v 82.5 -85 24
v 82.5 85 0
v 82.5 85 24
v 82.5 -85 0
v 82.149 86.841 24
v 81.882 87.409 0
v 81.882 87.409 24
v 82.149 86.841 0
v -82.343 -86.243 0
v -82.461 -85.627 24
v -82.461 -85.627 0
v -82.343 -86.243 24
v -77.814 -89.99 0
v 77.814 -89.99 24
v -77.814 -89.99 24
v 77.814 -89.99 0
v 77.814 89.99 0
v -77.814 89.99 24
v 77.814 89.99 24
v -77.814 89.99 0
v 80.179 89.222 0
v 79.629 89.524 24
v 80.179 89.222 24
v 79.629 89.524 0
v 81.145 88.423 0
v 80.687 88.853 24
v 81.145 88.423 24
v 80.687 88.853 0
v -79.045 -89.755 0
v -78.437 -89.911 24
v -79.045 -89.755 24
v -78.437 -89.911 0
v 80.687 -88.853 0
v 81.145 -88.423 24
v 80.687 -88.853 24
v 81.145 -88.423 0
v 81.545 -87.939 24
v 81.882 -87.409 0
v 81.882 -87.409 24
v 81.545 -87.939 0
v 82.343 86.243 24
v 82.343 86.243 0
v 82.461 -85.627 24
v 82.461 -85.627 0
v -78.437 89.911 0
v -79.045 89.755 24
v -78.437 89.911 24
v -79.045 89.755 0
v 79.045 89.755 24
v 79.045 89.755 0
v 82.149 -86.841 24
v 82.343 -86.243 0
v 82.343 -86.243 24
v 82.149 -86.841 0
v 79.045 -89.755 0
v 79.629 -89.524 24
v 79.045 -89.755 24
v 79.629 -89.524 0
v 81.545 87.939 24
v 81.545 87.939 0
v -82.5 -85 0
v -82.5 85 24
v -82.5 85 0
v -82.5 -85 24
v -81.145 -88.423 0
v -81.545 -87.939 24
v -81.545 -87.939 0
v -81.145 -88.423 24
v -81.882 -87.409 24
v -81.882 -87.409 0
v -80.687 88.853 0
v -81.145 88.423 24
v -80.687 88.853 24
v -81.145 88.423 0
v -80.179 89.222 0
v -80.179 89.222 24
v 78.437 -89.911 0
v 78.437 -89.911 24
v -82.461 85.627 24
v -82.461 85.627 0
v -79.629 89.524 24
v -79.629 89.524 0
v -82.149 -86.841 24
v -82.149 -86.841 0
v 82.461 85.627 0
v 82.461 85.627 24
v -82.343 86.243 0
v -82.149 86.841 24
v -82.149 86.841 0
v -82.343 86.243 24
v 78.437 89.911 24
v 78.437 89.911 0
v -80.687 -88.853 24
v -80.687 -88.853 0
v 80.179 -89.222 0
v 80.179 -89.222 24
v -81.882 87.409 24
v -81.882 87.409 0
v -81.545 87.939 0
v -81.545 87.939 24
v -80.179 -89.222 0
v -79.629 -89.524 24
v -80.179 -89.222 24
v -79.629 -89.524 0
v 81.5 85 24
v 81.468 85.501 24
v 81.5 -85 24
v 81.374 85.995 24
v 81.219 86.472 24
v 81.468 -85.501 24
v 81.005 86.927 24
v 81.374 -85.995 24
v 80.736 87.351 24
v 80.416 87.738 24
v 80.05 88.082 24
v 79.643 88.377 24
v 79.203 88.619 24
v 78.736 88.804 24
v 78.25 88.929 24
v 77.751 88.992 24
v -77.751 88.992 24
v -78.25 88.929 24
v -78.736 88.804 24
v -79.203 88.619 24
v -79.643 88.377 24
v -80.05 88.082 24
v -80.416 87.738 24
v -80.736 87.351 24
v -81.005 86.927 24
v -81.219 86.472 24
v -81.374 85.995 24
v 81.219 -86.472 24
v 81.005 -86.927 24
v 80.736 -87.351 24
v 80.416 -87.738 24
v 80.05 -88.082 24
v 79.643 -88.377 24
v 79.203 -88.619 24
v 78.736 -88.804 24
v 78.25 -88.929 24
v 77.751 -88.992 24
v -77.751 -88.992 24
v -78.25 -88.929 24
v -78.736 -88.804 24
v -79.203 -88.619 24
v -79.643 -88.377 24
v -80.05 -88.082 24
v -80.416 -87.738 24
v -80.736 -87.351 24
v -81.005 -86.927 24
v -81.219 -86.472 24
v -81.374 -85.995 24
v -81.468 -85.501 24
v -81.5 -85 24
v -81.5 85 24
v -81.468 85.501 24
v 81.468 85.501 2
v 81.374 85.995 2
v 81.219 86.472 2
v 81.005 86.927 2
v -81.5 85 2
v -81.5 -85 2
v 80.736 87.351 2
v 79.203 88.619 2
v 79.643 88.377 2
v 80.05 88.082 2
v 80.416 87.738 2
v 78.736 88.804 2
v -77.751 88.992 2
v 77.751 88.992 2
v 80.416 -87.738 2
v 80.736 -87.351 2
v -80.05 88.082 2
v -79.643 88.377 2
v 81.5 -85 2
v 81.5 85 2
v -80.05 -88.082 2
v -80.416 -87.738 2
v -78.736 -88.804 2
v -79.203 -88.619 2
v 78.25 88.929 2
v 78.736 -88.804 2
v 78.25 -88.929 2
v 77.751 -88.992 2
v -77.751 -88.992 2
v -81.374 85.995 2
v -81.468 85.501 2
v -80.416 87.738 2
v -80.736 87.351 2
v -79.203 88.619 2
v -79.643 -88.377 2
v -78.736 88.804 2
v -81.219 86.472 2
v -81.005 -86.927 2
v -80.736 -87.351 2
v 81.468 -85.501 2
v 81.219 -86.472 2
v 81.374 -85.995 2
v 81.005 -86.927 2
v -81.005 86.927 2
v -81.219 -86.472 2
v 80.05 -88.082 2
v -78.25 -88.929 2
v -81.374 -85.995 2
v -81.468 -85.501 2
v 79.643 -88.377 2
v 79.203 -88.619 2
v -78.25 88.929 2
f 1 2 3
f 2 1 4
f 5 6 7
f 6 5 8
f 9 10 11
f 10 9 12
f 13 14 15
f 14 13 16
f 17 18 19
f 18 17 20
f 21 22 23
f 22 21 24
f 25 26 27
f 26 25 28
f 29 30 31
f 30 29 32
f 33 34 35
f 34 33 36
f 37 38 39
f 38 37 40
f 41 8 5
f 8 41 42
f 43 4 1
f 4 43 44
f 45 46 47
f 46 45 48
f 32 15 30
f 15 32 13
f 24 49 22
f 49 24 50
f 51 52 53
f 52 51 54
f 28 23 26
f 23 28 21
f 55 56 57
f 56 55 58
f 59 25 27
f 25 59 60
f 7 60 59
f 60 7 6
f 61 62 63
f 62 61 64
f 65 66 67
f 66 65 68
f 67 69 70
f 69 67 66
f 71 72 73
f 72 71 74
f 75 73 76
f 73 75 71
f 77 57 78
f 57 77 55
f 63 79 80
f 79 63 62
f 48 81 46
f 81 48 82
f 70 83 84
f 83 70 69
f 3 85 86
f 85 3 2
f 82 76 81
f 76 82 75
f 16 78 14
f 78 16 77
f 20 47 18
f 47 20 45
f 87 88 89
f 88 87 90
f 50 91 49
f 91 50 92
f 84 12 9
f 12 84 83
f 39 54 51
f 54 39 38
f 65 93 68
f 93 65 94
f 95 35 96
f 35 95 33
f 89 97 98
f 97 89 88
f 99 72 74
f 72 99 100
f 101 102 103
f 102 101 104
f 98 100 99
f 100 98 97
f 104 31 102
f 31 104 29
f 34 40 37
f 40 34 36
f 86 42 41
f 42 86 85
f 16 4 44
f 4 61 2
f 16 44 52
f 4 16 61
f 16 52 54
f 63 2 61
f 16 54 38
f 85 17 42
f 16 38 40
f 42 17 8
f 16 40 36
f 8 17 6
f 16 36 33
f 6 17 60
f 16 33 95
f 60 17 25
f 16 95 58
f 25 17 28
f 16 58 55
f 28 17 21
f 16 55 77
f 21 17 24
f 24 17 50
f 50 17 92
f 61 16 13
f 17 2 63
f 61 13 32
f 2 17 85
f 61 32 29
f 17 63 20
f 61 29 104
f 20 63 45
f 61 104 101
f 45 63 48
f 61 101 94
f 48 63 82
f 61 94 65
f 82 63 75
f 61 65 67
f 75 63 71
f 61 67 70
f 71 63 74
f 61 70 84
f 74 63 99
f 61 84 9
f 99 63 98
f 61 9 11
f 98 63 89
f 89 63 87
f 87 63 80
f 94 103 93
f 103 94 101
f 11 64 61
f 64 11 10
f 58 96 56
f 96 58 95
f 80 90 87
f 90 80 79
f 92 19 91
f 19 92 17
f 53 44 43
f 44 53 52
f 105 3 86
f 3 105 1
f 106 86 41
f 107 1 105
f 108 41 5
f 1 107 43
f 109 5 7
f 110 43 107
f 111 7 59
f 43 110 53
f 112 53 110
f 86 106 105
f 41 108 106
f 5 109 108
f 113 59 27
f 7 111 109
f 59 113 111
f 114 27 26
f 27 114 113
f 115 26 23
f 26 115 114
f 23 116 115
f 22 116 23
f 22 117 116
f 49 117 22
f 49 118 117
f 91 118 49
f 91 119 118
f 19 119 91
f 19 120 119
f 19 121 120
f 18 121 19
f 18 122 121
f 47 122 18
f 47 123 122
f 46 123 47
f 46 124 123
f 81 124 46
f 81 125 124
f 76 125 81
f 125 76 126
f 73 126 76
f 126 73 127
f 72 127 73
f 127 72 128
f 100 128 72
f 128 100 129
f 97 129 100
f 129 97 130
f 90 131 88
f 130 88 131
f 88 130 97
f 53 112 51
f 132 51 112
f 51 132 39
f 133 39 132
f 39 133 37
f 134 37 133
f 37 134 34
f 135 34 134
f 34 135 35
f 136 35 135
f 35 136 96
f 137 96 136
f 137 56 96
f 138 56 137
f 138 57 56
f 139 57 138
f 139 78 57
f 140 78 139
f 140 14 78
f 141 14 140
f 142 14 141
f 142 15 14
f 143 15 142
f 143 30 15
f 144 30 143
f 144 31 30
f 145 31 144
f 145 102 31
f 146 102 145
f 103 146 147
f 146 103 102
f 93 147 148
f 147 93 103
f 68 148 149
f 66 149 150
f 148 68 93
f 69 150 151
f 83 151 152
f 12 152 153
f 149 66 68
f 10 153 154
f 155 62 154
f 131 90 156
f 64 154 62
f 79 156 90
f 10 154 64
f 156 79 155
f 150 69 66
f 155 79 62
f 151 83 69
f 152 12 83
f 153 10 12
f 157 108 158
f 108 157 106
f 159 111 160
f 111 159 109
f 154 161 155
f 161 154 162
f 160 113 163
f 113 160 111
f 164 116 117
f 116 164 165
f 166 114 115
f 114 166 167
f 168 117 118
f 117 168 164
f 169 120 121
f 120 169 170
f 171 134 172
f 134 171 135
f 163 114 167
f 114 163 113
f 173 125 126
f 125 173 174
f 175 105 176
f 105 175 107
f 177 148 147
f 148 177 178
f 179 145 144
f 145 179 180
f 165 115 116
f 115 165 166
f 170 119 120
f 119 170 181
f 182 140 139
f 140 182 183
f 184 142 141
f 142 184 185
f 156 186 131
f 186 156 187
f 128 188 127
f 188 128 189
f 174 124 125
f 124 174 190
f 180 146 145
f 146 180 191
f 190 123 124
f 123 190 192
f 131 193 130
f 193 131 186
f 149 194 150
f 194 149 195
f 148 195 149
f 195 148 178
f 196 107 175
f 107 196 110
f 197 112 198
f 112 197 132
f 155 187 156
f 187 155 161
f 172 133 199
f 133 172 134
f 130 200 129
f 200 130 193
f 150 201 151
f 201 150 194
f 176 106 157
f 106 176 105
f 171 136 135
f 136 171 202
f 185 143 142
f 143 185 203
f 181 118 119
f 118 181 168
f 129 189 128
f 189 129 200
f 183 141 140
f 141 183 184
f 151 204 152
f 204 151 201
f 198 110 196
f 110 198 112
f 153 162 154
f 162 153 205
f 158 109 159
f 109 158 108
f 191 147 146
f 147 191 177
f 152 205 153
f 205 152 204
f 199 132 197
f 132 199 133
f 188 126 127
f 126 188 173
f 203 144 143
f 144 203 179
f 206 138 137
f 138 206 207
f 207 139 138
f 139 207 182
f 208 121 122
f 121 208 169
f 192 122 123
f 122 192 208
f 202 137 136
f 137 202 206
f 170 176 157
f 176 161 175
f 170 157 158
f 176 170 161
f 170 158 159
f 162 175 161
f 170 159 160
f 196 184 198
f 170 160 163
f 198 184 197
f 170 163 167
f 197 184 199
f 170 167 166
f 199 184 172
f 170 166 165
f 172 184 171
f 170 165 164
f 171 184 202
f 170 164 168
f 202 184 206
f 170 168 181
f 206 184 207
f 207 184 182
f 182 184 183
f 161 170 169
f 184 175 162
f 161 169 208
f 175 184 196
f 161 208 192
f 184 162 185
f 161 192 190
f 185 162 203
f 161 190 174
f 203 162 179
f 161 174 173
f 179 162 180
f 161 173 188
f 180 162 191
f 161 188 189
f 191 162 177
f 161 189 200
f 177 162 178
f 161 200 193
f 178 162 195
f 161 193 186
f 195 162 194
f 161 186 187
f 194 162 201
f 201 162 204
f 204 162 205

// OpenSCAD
$fn = 50;


difference() {
	union() {
		hull() {
			translate(v = [-77.5000000000, 85.0000000000, 0]) {
				cylinder(h = 24, r = 5);
			}
			translate(v = [77.5000000000, 85.0000000000, 0]) {
				cylinder(h = 24, r = 5);
			}
			translate(v = [-77.5000000000, -85.0000000000, 0]) {
				cylinder(h = 24, r = 5);
			}
			translate(v = [77.5000000000, -85.0000000000, 0]) {
				cylinder(h = 24, r = 5);
			}
		}
	}
	union() {
		translate(v = [0, 0, 2]) {
			hull() {
				translate(v = [-77.5000000000, 85.0000000000, 0]) {
					cylinder(h = 22, r = 4);
				}
				translate(v = [77.5000000000, 85.0000000000, 0]) {
					cylinder(h = 22, r = 4);
				}
				translate(v = [-77.5000000000, -85.0000000000, 0]) {
					cylinder(h = 22, r = 4);
				}
				translate(v = [77.5000000000, -85.0000000000, 0]) {
					cylinder(h = 22, r = 4);
				}
			}
		}
	}
}
